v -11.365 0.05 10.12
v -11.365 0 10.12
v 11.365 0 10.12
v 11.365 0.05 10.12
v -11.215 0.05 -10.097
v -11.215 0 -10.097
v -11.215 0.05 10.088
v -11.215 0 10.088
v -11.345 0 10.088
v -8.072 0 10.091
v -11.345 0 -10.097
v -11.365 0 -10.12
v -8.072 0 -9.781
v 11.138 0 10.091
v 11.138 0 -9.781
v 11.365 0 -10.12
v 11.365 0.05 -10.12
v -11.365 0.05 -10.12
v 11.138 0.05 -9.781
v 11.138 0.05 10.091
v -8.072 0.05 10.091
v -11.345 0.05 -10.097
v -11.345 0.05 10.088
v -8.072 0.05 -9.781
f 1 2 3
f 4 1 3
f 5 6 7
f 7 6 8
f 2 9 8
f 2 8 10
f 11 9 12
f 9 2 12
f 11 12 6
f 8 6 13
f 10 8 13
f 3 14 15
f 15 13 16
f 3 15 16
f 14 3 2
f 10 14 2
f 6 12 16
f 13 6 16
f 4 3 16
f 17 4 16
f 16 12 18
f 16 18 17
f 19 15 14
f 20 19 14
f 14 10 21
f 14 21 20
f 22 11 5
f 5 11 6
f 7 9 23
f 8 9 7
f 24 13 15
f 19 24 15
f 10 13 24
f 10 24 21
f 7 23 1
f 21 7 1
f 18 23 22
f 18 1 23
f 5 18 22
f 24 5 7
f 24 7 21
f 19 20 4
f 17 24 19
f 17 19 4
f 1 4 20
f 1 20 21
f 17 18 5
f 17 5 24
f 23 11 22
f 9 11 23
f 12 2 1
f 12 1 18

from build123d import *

# Parameters (mm, degrees)
SKETCH1_W          = 22.73
SKETCH1_H          = 20.24
EXTRUDE1_DEPTH     = 0.05
SKETCH2_W          = 0.13
SKETCH2_H          = 20.185
CUT_EXTRUDE1_DEPTH = 1.05
SKETCH3_W          = 19.2096
SKETCH3_H          = 19.872
CUT_EXTRUDE2_DEPTH = 1.05


with BuildPart() as part:
    # Sketch1 → Extrude1 (new body)
    with BuildSketch(Plane(origin=(0, 0, 0), x_dir=(1, 0, 0), z_dir=(0, 1, 0))):
        Rectangle(SKETCH1_W, SKETCH1_H)
    extrude(amount=EXTRUDE1_DEPTH)

    # Sketch2 → Cut-Extrude1 (cut, through all)
    with BuildSketch(Plane.XZ):
        with Locations((-11.2796, -0.00435)):
            Rectangle(SKETCH2_W, SKETCH2_H)
    extrude(amount=-CUT_EXTRUDE1_DEPTH, mode=Mode.SUBTRACT)

    # Sketch3 → Cut-Extrude2 (cut, through all)
    with BuildSketch(Plane.XZ):
        with Locations((1.533, 0.155375)):
            Rectangle(SKETCH3_W, SKETCH3_H)
    extrude(amount=-CUT_EXTRUDE2_DEPTH, mode=Mode.SUBTRACT)


solid = part.part
